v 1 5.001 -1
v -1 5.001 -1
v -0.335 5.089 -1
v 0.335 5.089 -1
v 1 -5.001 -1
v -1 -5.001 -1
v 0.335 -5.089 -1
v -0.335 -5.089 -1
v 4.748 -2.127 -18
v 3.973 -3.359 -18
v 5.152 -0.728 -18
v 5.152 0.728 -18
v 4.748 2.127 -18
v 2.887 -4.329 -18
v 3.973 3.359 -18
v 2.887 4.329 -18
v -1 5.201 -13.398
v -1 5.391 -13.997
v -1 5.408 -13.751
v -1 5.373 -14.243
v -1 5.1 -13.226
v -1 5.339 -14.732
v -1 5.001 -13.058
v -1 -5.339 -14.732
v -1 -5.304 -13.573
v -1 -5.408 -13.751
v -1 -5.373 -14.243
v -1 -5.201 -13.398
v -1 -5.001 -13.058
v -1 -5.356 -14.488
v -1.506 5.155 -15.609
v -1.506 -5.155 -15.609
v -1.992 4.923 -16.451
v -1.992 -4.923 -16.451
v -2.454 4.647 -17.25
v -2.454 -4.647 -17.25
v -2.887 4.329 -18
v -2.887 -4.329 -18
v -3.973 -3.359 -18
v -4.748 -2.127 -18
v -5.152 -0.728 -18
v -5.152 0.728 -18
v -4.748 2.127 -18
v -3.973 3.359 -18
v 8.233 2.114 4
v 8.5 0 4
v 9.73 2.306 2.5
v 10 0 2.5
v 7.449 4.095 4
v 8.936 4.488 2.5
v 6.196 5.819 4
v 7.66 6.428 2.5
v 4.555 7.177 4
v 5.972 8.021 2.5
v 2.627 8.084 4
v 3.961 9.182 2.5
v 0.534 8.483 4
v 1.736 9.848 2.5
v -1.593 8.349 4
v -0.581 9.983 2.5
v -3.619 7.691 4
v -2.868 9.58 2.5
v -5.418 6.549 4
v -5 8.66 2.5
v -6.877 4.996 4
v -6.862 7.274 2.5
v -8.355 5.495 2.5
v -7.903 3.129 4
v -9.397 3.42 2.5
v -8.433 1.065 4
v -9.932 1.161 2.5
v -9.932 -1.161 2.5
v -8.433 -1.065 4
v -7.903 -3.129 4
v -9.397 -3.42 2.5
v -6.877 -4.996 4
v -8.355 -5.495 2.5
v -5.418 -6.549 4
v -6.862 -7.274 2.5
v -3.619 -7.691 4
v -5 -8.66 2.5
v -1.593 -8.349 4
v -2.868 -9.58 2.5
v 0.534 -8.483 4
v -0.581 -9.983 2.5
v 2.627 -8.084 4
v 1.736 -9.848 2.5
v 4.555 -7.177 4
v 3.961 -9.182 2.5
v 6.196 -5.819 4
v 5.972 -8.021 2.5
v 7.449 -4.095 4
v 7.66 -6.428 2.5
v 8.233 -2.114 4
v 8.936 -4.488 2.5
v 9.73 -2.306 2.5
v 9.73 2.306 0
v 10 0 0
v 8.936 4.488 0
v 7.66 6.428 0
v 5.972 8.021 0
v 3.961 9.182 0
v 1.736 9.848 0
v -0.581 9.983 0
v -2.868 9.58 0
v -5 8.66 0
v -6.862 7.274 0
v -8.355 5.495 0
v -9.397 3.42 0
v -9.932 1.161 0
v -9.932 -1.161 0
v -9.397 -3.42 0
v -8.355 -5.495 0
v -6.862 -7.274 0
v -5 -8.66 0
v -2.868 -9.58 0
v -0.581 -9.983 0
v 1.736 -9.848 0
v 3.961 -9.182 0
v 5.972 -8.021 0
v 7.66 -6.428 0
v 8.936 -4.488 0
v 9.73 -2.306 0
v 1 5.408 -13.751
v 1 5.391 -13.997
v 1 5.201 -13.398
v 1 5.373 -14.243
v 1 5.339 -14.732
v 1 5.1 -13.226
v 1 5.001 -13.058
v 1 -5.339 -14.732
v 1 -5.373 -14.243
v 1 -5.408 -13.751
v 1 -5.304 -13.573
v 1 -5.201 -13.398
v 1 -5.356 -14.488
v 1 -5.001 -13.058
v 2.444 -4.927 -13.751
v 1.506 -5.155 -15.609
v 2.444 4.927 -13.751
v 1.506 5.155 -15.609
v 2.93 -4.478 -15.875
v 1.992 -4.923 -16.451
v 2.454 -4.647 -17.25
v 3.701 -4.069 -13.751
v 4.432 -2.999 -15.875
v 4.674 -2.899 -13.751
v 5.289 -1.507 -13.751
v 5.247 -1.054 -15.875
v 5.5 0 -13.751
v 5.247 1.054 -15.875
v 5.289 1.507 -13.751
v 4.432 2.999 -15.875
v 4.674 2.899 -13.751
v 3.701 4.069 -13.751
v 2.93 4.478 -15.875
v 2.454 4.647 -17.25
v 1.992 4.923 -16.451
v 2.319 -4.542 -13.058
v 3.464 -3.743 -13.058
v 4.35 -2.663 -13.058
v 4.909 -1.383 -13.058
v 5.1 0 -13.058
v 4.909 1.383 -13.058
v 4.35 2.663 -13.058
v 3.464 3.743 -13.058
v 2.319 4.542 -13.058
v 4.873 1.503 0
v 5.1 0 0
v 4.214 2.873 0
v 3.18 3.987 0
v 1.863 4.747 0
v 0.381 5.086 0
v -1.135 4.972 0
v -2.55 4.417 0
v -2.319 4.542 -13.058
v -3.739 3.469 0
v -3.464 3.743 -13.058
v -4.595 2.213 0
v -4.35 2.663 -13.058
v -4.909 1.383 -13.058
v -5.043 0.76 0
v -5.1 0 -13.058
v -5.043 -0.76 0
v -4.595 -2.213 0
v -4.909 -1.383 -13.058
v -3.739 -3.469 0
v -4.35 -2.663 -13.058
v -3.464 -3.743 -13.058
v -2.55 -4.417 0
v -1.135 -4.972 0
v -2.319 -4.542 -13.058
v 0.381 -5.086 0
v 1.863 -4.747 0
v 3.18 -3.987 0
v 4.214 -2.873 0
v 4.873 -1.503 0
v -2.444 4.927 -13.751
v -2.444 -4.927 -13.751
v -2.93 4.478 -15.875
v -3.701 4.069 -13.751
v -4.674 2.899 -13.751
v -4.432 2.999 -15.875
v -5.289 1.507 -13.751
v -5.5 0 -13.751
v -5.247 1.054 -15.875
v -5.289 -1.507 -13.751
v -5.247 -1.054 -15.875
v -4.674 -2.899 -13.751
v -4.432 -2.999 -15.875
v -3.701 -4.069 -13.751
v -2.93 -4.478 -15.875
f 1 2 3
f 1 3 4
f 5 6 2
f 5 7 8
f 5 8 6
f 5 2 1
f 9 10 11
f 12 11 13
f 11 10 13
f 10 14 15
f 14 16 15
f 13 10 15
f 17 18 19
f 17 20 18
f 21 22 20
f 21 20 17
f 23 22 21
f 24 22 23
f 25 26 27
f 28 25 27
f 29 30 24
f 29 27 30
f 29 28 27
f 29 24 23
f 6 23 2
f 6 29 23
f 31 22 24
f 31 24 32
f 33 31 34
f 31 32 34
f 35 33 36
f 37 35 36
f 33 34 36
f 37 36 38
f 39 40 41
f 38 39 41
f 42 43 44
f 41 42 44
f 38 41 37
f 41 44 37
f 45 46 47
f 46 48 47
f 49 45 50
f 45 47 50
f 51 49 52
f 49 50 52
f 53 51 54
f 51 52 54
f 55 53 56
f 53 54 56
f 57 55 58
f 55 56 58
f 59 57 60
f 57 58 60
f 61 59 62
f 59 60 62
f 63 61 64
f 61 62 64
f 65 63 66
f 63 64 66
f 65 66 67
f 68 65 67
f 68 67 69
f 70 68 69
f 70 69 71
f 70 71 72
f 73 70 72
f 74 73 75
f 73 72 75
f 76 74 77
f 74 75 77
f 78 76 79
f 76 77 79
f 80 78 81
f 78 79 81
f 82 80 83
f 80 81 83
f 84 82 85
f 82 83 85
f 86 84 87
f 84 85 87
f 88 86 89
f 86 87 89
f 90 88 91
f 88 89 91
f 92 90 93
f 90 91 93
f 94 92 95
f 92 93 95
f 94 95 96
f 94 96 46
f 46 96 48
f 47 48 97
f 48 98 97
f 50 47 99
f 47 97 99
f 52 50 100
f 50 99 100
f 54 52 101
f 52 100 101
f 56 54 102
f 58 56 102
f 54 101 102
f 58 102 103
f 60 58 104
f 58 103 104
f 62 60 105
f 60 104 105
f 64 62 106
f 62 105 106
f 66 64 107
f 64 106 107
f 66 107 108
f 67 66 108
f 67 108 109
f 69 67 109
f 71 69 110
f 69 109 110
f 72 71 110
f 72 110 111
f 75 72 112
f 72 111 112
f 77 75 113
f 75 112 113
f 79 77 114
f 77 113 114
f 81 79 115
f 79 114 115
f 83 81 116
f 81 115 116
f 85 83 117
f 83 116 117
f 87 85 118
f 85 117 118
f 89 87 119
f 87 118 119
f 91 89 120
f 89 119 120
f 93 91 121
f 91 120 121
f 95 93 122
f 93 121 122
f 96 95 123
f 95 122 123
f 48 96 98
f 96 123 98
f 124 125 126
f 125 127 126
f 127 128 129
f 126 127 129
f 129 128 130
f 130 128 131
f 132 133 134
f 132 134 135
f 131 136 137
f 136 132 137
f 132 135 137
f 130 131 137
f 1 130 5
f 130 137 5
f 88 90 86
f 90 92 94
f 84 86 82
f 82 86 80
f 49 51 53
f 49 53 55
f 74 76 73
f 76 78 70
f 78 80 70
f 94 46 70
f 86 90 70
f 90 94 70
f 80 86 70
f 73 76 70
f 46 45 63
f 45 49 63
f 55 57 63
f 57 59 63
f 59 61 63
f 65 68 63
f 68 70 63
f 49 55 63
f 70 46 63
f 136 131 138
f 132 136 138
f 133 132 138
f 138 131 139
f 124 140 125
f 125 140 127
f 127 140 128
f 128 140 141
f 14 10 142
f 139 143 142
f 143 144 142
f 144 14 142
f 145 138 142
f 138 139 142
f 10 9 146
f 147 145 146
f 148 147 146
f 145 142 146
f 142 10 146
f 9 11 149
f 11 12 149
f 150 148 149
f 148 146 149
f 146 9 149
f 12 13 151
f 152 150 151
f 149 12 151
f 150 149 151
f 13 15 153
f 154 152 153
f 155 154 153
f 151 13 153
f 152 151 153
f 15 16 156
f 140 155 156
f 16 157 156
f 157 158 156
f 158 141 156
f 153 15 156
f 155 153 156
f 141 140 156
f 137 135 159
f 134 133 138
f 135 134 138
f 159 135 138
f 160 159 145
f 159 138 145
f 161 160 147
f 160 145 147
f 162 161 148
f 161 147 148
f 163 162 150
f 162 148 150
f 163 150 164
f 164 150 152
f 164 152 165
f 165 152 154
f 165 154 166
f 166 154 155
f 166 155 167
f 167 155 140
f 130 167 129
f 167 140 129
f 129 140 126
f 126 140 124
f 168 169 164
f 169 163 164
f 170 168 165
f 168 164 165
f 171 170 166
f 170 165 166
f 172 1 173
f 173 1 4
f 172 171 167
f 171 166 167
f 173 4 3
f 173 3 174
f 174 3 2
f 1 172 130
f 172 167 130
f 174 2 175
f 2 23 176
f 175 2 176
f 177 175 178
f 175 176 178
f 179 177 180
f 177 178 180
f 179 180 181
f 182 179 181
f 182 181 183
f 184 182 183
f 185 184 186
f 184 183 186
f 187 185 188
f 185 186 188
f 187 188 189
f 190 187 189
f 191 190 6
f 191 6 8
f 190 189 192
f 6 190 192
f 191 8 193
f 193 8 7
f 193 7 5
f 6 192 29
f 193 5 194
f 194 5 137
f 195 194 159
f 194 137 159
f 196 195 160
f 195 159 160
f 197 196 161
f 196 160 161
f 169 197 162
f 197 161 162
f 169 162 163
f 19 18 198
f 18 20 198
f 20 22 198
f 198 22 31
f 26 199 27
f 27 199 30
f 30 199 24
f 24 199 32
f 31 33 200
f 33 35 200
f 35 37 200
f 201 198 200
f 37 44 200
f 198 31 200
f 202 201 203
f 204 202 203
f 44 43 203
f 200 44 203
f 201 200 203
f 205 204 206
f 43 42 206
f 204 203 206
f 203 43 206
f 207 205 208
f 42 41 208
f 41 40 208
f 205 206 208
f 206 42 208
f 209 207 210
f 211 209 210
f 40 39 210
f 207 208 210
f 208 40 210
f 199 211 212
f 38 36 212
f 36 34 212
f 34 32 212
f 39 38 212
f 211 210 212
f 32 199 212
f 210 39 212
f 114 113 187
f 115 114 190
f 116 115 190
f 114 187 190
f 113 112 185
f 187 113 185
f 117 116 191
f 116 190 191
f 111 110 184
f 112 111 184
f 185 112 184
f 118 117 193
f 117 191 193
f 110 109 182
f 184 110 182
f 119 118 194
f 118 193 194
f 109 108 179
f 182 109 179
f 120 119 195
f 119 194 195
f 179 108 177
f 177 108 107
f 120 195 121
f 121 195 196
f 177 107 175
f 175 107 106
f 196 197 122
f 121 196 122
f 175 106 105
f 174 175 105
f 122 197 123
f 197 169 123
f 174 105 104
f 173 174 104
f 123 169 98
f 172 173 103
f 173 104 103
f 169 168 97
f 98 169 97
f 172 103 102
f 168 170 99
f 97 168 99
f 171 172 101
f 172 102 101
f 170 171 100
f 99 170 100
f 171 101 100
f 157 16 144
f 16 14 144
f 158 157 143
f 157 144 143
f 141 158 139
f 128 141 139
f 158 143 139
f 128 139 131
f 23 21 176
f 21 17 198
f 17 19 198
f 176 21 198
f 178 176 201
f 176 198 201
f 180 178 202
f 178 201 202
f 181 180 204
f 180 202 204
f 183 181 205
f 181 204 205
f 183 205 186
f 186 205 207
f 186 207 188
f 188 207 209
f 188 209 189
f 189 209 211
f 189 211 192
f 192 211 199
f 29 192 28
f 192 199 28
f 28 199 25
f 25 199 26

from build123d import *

# Parameters (mm, degrees)
SKETCH002_W  = 2
SKETCH002_H  = 25
PAD001_DEPTH = 15
PAD_DEPTH    = 7.5


with BuildPart() as pad001:
    # Sketch002 → Pad001 (new body, symmetric)
    with BuildSketch(Plane.XZ):
        with Locations((0, -13.5)):
            Rectangle(SKETCH002_W, SKETCH002_H)
    extrude(amount=PAD001_DEPTH, both=True)


with BuildPart() as pad:
    # Sketch001 → Pad (new body, symmetric)
    with BuildSketch(Plane.XZ):
        Polygon((8, -26.856406), (0, -13), (-8, -26.856406), align=None)
    extrude(amount=PAD_DEPTH, both=True)


with BuildPart() as cut001:
    # Sketch → Revolution (revolve)
    with BuildSketch(Plane.XZ):
        Polygon((0, 4), (8.5, 4), (10, 2.5), (10, 0), (5.1, 0), (5.1, -13.058023), (5.5, -13.750843), (5.20287, -18), (0, -18), align=None)
    revolve(axis=Axis((0, 0, 0), (0, 0, 1)))

    # Cut: cut Pad
    add(pad.part, mode=Mode.SUBTRACT)

    # Cut001: cut Pad001
    add(pad001.part, mode=Mode.SUBTRACT)


solid = cut001.part
